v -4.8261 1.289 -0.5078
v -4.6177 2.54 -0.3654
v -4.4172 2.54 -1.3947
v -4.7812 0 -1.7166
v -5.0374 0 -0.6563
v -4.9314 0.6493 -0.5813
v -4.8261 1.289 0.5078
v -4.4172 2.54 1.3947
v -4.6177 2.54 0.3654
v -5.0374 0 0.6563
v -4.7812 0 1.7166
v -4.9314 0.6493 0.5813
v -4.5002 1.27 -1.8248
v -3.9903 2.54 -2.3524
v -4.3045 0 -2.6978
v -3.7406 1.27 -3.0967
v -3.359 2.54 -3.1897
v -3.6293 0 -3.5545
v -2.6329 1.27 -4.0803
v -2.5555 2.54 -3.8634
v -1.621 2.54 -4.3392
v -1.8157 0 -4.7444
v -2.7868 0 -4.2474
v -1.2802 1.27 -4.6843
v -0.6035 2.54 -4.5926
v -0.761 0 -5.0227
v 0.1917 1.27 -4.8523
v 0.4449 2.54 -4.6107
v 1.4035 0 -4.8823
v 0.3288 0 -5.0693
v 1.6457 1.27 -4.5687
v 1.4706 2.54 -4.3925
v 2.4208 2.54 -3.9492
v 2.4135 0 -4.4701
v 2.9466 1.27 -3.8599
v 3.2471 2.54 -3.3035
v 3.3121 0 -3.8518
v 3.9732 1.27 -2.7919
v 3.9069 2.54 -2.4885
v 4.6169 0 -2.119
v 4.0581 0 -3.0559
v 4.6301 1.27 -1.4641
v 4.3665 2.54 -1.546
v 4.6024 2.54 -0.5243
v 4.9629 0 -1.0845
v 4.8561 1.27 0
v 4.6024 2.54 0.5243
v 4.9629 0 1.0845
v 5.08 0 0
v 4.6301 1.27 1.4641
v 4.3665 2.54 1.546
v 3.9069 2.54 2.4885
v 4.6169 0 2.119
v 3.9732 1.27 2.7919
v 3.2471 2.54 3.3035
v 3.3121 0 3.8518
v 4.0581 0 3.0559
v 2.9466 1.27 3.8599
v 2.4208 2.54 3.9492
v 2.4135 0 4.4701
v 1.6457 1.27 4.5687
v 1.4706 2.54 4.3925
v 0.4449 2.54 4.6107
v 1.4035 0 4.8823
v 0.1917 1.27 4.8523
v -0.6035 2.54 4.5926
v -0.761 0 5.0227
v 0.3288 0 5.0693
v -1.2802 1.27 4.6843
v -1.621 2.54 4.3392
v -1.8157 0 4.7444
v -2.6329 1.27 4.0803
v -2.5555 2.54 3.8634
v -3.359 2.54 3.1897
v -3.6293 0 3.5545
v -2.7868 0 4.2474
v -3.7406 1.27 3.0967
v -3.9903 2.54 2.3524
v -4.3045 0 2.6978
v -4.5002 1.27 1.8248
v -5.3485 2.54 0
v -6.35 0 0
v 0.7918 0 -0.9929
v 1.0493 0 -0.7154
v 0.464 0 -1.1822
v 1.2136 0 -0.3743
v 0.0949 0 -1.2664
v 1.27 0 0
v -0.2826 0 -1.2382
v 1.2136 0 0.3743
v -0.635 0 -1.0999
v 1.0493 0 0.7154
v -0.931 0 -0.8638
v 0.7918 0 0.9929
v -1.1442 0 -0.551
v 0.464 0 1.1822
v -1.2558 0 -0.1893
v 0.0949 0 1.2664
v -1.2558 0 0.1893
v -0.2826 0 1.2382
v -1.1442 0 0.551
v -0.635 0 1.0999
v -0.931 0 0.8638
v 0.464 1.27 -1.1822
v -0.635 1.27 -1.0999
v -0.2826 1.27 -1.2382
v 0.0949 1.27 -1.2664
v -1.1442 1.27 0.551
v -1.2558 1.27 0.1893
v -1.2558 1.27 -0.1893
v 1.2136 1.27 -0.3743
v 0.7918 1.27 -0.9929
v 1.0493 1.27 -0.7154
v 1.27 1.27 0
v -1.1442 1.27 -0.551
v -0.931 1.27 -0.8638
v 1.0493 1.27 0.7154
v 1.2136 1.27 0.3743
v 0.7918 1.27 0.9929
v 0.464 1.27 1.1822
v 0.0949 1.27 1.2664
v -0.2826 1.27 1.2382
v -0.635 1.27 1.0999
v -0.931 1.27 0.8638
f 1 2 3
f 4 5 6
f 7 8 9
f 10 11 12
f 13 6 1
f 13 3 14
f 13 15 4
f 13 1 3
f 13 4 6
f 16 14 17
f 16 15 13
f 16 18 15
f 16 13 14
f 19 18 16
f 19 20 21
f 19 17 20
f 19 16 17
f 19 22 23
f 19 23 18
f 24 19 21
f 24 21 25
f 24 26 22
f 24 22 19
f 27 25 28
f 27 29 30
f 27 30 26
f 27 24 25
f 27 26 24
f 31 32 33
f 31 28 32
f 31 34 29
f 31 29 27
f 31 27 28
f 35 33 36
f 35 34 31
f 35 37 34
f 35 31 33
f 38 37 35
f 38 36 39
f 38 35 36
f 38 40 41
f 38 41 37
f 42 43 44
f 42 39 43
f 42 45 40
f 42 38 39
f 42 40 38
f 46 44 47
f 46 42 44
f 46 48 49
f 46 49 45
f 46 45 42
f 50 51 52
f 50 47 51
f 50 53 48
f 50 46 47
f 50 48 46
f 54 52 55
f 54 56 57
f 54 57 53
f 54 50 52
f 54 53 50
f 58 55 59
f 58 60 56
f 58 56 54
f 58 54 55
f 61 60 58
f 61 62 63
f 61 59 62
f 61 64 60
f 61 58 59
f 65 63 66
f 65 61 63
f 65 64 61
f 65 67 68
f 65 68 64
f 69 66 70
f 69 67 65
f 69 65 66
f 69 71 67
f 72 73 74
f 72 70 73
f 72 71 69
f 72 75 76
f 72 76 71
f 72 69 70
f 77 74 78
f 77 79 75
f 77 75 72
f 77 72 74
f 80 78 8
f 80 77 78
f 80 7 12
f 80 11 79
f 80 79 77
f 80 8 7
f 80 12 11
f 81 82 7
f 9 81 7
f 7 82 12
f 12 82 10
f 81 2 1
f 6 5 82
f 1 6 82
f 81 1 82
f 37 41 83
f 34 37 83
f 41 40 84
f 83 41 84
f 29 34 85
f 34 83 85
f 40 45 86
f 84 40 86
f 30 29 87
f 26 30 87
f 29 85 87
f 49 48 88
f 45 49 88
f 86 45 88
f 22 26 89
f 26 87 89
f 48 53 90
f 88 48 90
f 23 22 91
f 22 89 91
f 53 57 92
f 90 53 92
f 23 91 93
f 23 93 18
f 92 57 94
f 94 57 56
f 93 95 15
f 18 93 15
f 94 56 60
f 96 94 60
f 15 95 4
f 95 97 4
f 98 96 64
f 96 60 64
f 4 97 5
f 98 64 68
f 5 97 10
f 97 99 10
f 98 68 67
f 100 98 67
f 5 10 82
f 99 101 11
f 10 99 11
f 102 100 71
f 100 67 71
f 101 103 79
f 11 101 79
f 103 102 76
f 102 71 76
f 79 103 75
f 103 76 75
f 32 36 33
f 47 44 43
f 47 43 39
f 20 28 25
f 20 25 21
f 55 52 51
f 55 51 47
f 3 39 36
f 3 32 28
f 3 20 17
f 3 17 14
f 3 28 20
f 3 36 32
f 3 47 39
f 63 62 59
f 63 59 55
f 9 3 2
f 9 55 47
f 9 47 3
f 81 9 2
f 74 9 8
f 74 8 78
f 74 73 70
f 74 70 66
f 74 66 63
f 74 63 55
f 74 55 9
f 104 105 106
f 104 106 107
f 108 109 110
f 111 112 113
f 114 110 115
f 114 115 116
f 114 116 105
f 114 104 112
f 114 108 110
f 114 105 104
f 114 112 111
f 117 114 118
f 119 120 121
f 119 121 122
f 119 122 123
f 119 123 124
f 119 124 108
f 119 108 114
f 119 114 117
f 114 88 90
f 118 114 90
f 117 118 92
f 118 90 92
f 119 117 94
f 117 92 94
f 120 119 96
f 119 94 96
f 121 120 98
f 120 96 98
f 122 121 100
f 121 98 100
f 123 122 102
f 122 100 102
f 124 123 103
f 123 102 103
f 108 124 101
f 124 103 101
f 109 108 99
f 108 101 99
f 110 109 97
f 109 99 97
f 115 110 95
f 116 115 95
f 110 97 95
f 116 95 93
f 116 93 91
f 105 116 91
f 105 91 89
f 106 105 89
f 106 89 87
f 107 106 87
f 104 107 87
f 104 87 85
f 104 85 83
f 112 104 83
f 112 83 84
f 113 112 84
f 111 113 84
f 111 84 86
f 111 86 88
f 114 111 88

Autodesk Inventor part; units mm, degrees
ref_plane "YZ Plane" through (0, 0, 0) normal (1, 0, 0) x (0, 1, 0)
ref_plane "XZ Plane" through (0, 0, 0) normal (0, 1, 0) x (-1, 0, 0)
ref_plane "XY Plane" through (0, 0, 0) normal (0, 0, 1) x (1, 0, 0)
sketch "Sketch1" plane through (0, 0, 0) normal (0, 1, 0) x (-1, 0, 0)
  circle A0 centre (0, 0) radius 5.08
  line L0 (0, 0) -> (0, 3.175)
  line L1 (0, 0) -> (0, -3.175)
  circle A1 centre (0, 0) radius 6.35
  line L2 (0, 3.175) -> (6.35, 0)
  line L3 (0, -3.175) -> (6.35, 0)
  point P0 (5.037429, -0.656286)
  point P1 (5.037429, 0.656286)
  dimension "d3" = 12.7
  dimension "d0" = 10.16
  dimension "d1" = 3.175
  dimension "d2" = 3.175
  dimension "d4" = 6.35
sketch "Sketch1 outline for Extrusion1" plane through (0, 0, 0) normal (0, 1, 0) x (-1, 0, 0)
  line L0 (5.037429, -0.656286) -> (6.35, 0)
  arc A0 (5.037429, 0.656286) -> (5.037429, -0.656286) centre (0, 0) ccw
  line L1 (6.35, 0) -> (5.037429, 0.656286)
extrude "Extrusion1" add sketch "Sketch1 outline for Extrusion1" along normal blind 2.54 draft -10
sketch "Sketch2" plane through (0, 0, 0) normal (0, -1, 0) x (1, 0, 0)
  circle A0 centre (0, 0) radius 1.27
  dimension "d7" = 2.54
extrude "Extrusion2" cut sketch "Sketch2" against normal blind 1.27
properties part number "ChairDial(H)"
